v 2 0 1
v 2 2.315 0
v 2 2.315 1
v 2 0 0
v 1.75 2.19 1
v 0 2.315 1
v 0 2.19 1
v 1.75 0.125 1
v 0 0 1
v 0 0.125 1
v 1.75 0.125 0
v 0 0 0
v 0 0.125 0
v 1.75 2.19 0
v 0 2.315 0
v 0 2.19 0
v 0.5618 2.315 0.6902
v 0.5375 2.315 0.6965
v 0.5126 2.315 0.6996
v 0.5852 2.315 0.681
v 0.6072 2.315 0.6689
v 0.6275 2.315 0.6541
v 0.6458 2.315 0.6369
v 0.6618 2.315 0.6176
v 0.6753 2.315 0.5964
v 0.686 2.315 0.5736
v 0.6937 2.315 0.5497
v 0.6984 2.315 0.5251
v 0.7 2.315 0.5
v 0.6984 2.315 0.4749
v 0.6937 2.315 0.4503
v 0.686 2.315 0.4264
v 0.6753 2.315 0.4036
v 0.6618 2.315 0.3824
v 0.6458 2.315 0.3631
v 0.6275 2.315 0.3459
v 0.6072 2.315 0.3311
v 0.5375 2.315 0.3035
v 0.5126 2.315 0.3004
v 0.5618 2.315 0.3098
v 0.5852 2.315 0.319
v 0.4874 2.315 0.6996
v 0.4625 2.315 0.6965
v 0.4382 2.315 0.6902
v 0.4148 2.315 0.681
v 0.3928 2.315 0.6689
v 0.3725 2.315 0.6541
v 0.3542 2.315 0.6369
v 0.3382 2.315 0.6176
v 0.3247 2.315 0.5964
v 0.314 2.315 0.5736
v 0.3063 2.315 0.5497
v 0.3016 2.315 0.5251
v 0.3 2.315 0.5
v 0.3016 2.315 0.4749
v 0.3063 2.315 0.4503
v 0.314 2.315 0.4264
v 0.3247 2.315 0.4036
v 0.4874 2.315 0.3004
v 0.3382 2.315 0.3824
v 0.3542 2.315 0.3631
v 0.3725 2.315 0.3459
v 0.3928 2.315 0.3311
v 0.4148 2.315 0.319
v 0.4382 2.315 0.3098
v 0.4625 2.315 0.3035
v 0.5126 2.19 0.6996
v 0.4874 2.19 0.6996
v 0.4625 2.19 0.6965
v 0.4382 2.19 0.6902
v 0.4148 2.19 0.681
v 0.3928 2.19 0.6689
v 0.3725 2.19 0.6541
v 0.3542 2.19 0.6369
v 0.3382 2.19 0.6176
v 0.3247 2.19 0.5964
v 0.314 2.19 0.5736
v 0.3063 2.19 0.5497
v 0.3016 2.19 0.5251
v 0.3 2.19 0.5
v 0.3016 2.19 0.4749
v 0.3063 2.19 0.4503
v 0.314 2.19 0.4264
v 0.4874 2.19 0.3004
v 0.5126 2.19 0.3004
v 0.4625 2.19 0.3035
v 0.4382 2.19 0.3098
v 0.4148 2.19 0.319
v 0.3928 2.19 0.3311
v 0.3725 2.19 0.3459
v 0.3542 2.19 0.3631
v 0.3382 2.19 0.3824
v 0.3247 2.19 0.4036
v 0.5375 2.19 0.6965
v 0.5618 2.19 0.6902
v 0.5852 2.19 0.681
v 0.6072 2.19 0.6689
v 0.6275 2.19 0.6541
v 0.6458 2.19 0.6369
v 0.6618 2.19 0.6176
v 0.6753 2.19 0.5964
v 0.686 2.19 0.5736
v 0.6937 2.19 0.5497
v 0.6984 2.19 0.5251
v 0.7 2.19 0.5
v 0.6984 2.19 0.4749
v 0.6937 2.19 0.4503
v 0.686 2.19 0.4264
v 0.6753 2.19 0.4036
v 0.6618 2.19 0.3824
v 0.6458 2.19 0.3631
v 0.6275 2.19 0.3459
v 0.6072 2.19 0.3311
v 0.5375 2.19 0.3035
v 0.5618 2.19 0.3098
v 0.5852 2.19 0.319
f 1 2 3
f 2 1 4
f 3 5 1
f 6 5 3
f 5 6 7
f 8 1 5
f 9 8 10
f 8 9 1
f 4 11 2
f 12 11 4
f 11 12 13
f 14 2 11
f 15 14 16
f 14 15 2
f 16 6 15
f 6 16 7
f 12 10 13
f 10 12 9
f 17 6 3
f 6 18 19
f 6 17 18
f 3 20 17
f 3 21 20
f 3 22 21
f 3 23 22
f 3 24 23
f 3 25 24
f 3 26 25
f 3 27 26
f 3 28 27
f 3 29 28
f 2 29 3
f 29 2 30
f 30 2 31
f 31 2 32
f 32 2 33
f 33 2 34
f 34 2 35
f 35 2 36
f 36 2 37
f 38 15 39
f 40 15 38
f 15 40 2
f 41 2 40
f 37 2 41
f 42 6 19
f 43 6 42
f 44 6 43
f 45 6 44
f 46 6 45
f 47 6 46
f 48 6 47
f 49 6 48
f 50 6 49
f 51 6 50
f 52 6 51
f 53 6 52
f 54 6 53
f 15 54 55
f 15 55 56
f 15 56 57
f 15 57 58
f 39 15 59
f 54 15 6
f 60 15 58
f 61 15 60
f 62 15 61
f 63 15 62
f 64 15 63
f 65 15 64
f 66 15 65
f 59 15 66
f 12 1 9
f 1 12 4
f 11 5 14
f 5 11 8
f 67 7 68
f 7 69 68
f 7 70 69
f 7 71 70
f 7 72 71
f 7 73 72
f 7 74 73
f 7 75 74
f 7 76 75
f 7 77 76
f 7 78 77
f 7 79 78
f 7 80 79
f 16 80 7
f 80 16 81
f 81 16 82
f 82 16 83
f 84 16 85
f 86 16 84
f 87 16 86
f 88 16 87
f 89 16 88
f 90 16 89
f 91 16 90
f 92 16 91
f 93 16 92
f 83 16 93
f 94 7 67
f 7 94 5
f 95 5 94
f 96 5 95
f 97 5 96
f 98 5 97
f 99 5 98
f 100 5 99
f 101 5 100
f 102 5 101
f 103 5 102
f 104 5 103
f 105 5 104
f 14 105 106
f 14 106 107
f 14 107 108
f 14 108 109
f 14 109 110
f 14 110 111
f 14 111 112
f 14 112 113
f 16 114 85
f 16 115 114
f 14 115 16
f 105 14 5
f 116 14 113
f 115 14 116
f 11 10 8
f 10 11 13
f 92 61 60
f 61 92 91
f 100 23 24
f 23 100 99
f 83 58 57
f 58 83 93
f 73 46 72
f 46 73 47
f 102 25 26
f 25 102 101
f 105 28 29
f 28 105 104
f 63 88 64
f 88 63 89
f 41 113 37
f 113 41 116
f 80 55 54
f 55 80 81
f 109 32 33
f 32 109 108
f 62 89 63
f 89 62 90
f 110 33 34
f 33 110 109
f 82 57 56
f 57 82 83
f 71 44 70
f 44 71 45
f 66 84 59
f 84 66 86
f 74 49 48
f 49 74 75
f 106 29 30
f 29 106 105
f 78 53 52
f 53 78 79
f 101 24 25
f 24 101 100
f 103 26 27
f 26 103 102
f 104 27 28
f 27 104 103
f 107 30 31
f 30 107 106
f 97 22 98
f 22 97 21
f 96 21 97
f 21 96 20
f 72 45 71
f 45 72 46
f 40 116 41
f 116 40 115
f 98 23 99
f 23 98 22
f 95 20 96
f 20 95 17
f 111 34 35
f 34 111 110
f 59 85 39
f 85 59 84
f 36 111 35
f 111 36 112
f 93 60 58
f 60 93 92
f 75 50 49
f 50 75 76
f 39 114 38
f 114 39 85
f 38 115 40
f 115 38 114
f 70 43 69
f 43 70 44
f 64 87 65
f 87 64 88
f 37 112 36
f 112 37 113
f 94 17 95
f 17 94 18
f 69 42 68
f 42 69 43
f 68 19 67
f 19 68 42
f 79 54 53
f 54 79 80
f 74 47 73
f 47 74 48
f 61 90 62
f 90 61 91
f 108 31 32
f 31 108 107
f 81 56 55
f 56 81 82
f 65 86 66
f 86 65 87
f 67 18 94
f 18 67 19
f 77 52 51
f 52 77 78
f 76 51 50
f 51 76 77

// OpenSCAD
$fn = 50;
//use<shoulderServoBracket.scad>
//
//translate([1,0.4,-0.15])
//rotate([0,0,90])
//shoulderServoBracket();

module shoulderArmBracket(){
  cylinderRadius = 0.2;
  bracketThickness = 0.25;
  servoHornHeight = 0.1;
  servoHeight = 1.465+servoHornHeight;
  bracketLength = servoHeight + 2*bracketThickness + 0.25; 
  bracketHeight = 1;
  bracketWidth = 2;

difference(){
  cube([bracketWidth,bracketLength,bracketHeight]);
  translate([0,bracketThickness/2,0])
  cube([bracketWidth-bracketThickness,bracketLength-bracketThickness,bracketHeight]);
  translate([bracketWidth/4,bracketLength,bracketHeight/2])
  rotate([90,0,0])
  cylinder(r=cylinderRadius,h=bracketThickness,center=true);
}

}
shoulderArmBracket();
